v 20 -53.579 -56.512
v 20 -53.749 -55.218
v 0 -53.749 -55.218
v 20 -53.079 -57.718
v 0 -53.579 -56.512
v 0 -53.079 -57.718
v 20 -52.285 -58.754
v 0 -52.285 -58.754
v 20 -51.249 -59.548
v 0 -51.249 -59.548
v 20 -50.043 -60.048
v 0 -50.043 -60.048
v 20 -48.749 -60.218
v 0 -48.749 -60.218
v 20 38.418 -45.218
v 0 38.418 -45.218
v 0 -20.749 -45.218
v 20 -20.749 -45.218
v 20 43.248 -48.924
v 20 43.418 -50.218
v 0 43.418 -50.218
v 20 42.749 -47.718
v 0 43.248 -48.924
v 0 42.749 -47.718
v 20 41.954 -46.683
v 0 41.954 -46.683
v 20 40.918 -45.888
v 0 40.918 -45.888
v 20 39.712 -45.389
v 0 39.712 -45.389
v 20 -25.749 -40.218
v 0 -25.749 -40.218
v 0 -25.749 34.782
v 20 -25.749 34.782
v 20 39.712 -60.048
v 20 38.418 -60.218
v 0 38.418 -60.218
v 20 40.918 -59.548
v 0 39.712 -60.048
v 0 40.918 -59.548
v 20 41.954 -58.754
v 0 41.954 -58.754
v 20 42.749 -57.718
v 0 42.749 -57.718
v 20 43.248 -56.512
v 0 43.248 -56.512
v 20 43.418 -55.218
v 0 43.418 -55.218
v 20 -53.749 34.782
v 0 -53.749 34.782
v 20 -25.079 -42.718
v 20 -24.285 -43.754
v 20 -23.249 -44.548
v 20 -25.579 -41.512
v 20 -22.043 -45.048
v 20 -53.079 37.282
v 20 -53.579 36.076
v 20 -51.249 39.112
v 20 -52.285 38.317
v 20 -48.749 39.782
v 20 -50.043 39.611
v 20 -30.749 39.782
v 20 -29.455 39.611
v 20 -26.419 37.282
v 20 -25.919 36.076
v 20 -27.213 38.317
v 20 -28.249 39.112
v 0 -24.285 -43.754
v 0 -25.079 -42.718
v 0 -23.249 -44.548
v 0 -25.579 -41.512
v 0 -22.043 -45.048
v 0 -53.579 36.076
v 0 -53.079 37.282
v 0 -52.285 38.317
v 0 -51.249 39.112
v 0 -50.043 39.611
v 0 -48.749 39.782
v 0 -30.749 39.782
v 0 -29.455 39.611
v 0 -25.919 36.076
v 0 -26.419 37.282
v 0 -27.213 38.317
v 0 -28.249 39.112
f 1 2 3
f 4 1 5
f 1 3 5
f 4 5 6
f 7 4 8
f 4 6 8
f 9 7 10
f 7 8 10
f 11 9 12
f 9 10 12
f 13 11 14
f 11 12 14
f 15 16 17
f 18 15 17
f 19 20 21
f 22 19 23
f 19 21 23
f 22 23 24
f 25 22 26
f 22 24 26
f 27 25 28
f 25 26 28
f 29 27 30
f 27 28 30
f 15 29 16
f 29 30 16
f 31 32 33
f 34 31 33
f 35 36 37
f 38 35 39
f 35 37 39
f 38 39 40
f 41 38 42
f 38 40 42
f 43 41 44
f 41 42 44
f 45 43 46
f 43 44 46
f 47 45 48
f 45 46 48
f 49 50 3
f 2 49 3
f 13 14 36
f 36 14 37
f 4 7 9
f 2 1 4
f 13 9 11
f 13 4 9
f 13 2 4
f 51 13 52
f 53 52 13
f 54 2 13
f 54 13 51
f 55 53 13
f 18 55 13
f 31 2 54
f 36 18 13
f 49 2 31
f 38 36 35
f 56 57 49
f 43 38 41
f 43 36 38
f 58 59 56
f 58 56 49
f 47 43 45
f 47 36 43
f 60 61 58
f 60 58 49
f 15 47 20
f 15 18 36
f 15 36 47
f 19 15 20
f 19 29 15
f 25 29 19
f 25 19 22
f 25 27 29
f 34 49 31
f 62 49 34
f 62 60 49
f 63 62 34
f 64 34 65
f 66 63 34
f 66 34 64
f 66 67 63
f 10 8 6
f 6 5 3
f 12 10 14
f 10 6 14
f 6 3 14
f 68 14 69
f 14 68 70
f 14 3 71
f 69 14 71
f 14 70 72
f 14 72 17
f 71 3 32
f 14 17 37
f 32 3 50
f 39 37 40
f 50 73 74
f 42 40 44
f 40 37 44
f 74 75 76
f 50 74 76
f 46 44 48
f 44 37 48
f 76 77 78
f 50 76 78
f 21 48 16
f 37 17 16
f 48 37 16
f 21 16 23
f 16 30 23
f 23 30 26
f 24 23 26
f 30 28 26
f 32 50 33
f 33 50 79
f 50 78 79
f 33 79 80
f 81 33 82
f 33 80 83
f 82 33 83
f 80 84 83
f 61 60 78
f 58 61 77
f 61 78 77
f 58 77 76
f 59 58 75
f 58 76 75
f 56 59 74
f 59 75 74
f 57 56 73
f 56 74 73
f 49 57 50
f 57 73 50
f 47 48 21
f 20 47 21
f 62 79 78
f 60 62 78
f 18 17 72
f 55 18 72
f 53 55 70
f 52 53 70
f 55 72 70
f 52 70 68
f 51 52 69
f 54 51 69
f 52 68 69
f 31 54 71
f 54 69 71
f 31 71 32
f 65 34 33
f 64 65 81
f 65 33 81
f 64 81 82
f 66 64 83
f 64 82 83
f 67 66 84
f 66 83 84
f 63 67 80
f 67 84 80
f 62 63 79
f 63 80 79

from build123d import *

# Parameters (mm, degrees)
F1_DEPTH = 20


with BuildPart() as f1:
    # F0 (on Right) → F1 (new body)
    with BuildSketch(Plane.YZ):
        with BuildLine():
            Line((-30.74899, 39.781864), (-48.74899, 39.781864))
            ThreePointArc((-48.74899, 39.781864), (-52.284524, 38.317398), (-53.74899, 34.781864))
            Line((-53.74899, 34.781864), (-53.74899, -55.218136))
            ThreePointArc((-53.74899, -55.218136), (-52.284524, -58.75367), (-48.74899, -60.218136))
            Line((-48.74899, -60.218136), (38.41838, -60.218136))
            ThreePointArc((38.41838, -60.218136), (41.953914, -58.75367), (43.41838, -55.218136))
            Line((43.41838, -55.218136), (43.41838, -50.218136))
            ThreePointArc((43.41838, -50.218136), (41.953914, -46.682602), (38.41838, -45.218136))
            Line((38.41838, -45.218136), (-20.74899, -45.218136))
            ThreePointArc((-20.74899, -45.218136), (-24.284524, -43.75367), (-25.74899, -40.218136))
            Line((-25.74899, -40.218136), (-25.74899, 34.781864))
            ThreePointArc((-25.74899, 34.781864), (-27.213456, 38.317398), (-30.74899, 39.781864))
        make_face()
    extrude(amount=F1_DEPTH)


solid = f1.part
